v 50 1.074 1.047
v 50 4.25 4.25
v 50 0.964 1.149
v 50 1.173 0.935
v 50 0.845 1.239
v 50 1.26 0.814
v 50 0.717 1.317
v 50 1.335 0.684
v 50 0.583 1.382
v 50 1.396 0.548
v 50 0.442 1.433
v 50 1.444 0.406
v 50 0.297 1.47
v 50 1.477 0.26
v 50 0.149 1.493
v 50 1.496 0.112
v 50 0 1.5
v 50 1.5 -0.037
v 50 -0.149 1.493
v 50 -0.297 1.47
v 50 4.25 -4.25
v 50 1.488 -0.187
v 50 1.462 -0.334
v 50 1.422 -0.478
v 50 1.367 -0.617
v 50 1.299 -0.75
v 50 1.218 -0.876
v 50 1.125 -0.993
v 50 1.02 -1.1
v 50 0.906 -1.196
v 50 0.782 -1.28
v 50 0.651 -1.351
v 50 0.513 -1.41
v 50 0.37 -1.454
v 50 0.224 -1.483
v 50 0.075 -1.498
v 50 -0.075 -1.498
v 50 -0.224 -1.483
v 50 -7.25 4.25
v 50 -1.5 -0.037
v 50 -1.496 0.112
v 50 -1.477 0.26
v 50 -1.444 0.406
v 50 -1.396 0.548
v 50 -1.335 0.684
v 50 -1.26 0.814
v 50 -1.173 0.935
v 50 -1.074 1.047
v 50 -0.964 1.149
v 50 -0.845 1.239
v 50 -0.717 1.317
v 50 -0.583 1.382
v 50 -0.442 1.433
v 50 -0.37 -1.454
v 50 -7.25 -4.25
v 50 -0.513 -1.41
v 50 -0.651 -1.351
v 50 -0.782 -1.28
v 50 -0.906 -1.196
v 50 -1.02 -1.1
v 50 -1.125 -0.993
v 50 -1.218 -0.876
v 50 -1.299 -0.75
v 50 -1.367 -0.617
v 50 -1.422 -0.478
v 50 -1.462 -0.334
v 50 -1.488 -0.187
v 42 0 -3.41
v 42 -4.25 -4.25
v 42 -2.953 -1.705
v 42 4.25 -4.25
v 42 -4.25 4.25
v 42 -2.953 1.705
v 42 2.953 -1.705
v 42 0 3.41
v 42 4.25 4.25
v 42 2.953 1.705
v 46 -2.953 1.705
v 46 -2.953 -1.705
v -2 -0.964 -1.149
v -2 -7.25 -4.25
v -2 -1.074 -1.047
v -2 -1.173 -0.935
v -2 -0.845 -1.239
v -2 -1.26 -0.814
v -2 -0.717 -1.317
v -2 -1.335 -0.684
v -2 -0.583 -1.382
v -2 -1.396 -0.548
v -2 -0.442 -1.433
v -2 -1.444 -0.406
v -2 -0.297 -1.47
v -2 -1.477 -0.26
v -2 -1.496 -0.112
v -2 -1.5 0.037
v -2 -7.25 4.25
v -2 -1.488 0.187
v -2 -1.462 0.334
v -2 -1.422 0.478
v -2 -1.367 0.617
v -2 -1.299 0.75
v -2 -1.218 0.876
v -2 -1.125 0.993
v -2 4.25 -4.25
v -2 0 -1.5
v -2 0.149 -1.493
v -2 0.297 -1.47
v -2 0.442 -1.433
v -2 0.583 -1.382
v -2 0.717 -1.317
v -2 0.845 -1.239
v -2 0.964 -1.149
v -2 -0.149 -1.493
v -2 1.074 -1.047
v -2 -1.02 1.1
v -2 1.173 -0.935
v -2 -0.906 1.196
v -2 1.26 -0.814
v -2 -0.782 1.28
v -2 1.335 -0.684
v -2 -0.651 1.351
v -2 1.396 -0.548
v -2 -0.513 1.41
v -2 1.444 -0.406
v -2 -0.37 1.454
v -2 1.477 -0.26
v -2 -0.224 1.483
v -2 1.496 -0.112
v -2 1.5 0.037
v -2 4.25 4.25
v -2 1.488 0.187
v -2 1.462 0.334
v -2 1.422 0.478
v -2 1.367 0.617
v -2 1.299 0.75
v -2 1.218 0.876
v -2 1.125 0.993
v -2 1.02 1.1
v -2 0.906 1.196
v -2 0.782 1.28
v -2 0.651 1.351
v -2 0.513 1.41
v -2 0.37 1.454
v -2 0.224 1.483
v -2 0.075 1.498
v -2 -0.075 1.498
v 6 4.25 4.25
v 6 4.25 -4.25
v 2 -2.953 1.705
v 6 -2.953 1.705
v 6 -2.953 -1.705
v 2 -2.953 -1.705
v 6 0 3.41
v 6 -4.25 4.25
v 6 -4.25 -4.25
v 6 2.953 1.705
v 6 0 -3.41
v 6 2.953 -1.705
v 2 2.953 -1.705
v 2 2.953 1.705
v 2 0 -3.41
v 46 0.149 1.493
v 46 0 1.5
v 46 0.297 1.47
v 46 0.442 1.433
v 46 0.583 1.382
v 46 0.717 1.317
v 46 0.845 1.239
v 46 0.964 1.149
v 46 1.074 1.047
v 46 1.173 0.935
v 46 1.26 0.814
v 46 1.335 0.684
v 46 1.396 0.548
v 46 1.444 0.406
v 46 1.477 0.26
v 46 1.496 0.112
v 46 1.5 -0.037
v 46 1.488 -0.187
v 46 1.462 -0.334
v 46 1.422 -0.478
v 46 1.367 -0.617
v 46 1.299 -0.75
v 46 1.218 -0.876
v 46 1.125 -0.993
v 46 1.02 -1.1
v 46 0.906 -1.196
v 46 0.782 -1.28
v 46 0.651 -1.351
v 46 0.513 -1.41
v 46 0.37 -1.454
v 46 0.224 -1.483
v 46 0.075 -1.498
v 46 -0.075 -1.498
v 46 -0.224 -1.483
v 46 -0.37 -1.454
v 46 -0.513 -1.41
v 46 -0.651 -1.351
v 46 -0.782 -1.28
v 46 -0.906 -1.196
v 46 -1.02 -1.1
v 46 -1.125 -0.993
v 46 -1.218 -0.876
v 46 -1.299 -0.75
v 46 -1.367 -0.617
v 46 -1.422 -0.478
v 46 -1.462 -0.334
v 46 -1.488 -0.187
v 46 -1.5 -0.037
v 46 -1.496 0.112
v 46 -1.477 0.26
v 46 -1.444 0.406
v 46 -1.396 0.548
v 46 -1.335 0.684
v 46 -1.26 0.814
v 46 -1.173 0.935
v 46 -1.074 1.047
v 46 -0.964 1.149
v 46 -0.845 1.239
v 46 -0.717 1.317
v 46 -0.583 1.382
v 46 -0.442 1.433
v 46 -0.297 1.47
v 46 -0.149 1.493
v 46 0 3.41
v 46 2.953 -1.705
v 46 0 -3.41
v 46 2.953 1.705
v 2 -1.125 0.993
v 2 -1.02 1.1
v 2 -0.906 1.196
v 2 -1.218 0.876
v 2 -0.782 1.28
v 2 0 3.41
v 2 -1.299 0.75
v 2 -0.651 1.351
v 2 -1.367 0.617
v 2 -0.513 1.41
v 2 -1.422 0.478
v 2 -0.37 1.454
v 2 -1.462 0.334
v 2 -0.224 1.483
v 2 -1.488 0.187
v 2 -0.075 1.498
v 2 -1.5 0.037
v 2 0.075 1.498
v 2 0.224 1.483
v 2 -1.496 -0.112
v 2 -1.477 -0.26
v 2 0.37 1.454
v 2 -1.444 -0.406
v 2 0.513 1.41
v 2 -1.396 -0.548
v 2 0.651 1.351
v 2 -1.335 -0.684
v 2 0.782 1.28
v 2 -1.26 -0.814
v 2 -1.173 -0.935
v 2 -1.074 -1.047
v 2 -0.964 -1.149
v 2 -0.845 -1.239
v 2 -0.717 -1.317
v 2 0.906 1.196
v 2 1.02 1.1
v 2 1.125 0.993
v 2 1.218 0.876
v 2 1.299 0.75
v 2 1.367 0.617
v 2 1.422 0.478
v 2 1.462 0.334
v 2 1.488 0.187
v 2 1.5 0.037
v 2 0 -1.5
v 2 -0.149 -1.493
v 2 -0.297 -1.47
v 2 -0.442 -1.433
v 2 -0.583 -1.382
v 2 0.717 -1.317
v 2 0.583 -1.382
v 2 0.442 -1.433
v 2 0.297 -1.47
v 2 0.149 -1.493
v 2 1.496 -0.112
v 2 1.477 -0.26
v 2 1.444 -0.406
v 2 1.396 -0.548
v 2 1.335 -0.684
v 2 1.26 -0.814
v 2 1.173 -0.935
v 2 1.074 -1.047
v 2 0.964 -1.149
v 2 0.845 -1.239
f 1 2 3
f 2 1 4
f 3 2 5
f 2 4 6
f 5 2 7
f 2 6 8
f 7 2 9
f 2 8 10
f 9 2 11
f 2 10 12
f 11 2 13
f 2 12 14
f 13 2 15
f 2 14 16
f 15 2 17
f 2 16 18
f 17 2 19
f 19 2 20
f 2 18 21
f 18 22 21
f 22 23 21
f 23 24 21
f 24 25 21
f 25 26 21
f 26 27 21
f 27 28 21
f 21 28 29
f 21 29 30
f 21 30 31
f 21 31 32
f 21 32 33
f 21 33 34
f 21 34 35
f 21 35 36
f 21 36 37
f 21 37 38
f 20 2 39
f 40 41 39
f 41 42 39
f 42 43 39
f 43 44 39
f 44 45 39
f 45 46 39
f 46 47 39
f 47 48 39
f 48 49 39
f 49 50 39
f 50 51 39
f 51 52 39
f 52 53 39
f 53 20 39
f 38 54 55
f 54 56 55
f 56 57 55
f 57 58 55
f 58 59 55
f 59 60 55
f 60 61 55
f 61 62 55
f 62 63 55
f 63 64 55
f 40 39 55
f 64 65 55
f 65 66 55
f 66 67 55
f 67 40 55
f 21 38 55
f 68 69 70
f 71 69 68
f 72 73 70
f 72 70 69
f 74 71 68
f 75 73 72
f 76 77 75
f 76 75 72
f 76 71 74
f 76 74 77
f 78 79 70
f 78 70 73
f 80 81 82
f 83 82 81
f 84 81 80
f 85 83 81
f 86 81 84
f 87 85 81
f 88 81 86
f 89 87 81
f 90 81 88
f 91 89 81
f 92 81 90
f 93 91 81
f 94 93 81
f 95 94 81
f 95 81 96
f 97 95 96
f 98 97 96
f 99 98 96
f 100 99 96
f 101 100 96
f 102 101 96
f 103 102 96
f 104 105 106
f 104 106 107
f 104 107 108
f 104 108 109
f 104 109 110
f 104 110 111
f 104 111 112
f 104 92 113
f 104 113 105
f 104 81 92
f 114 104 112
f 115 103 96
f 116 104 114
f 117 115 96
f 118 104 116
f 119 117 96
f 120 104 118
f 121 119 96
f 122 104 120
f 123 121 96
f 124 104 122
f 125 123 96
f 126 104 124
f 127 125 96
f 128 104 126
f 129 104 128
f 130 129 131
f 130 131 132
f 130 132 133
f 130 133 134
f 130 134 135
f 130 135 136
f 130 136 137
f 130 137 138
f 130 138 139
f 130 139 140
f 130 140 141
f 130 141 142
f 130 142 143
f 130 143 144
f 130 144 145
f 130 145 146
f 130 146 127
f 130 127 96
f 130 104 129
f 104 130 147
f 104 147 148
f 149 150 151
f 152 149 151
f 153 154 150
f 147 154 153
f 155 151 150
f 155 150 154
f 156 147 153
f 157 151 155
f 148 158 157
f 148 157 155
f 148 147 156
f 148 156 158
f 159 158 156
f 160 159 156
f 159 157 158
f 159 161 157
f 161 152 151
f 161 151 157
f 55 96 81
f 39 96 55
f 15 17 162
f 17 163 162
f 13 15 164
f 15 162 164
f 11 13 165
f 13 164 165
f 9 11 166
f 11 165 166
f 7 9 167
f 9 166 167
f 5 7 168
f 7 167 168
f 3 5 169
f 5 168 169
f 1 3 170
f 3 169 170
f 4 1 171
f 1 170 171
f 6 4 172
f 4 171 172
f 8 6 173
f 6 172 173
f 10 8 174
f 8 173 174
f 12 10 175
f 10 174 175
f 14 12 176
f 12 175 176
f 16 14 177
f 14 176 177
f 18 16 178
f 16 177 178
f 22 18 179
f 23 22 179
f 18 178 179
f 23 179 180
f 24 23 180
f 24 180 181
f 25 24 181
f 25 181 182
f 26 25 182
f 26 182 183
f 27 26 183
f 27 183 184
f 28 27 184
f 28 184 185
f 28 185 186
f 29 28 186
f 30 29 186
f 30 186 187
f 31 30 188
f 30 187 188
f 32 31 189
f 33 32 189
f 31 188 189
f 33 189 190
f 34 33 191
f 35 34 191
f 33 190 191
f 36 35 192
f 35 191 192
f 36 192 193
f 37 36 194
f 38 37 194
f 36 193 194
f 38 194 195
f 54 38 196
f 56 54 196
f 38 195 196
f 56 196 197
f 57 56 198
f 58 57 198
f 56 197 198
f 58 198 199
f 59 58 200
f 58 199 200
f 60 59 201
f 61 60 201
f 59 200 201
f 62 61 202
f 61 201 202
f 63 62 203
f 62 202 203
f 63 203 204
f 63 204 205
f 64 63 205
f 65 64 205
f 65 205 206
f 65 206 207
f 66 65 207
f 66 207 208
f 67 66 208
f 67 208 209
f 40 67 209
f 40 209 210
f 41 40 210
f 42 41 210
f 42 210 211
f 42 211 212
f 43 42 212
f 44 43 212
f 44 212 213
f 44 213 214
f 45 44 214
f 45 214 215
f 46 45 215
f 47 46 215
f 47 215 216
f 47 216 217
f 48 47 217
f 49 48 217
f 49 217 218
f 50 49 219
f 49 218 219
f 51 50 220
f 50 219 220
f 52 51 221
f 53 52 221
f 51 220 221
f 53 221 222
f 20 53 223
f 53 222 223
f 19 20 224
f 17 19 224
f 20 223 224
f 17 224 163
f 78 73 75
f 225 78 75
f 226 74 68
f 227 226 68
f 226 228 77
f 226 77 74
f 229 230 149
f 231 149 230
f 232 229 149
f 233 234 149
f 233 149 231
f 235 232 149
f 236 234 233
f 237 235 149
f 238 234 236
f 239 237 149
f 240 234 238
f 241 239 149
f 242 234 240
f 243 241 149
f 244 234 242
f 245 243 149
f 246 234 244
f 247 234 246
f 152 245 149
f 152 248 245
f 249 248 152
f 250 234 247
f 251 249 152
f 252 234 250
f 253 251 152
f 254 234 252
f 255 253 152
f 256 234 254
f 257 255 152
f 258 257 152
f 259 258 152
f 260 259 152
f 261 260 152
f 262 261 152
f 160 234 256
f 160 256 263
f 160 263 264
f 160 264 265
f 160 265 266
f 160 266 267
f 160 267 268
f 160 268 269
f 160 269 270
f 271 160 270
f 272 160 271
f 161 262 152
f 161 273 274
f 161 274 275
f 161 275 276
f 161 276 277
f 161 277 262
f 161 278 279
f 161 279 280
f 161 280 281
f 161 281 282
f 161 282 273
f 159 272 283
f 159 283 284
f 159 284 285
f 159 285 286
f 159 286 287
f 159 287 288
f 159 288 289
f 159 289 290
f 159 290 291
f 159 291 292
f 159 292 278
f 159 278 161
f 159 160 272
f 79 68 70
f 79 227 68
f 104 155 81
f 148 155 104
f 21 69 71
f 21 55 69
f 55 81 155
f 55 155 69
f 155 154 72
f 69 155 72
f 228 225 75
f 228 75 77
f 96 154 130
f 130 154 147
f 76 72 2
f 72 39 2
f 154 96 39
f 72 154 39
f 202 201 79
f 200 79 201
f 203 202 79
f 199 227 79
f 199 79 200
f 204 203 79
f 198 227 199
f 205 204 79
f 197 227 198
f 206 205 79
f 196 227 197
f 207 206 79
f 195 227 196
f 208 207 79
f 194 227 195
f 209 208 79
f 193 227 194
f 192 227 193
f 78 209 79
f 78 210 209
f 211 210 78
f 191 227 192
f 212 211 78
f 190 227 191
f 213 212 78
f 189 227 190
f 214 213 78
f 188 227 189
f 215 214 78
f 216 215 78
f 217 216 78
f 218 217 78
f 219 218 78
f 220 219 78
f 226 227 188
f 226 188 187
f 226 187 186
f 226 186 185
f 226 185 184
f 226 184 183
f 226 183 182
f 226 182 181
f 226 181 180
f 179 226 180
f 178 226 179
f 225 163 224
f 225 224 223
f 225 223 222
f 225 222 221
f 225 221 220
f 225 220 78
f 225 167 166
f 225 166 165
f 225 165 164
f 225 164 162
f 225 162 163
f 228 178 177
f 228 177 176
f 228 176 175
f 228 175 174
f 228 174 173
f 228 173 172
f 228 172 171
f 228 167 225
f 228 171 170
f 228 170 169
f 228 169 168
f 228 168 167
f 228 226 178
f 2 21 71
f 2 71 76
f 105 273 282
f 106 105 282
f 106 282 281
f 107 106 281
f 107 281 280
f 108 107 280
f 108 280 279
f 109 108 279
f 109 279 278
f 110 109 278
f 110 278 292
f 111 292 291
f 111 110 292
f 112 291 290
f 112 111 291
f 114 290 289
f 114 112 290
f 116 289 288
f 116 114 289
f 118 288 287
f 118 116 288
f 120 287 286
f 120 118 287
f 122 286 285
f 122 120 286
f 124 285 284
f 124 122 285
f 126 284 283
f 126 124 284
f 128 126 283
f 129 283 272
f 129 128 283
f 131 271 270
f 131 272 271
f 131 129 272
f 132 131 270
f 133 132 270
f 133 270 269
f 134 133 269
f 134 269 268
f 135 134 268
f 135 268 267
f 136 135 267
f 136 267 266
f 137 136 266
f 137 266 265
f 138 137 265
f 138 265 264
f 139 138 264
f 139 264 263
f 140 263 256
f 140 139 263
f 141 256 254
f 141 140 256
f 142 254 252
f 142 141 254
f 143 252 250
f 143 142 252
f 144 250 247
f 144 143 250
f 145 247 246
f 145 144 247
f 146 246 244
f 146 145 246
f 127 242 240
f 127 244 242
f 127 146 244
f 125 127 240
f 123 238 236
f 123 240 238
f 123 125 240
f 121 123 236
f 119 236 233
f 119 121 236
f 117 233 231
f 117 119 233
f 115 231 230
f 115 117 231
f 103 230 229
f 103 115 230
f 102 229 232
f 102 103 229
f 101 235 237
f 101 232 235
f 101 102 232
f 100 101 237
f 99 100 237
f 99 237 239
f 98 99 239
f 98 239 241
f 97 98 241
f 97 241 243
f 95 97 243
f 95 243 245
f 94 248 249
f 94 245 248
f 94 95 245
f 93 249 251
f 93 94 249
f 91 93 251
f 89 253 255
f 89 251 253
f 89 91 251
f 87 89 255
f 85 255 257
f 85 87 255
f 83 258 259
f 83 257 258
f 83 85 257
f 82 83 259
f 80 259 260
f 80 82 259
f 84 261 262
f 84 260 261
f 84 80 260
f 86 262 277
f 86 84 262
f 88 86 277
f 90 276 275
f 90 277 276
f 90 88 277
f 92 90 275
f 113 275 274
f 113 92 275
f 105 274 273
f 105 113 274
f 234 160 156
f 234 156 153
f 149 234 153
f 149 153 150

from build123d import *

# Parameters (mm, degrees)
SKETCH1_W           = 8.5
SKETCH1_H           = 8.5
BOSS_EXTRUDE1_DEPTH = 5
SKETCH2_W           = 8.5
SKETCH2_H           = 8.5
BOSS_EXTRUDE2_DEPTH = 2
SKETCH3_R           = 1.5
CUT_EXTRUDE1_DEPTH  = 2
SKETCH4_W           = 52
SKETCH4_H           = 8.5
BOSS_EXTRUDE3_DEPTH = 3
SKETCH5_W           = 7
SKETCH5_H           = 8.5
BOSS_EXTRUDE4_DEPTH = 8.5
CUT_EXTRUDE2_DEPTH  = 5
SKETCH7_R           = 1.5
CUT_EXTRUDE3_DEPTH  = 5
SKETCH8_R           = 1.5
BOSS_EXTRUDE5_DEPTH = 2.5
SKETCH9_R           = 1.5
BOSS_EXTRUDE6_DEPTH = 2.5
SKETCH10_W          = 8.5
SKETCH10_H          = 8.5
BOSS_EXTRUDE7_DEPTH = 1
SKETCH11_W          = 8.5
SKETCH11_H          = 8.5
BOSS_EXTRUDE8_DEPTH = 1
CUT_EXTRUDE4_DEPTH  = 0.5
CUT_EXTRUDE5_DEPTH  = 0.5


with BuildPart() as part:
    # Sketch1 → Boss-Extrude1 (new body)
    with BuildSketch(Plane(origin=(0, 0, 0), x_dir=(0, 0, -1), z_dir=(1, 0, 0))):
        Rectangle(SKETCH1_W, SKETCH1_H)
        Polygon((1.705, 2.953146627), (-1.705, 2.953146627), (-3.41, 0), (-1.705, -2.953146627), (1.705, -2.953146627), (3.41, 0), align=None, mode=Mode.SUBTRACT)
    extrude(amount=BOSS_EXTRUDE1_DEPTH)

    # Sketch2 → Boss-Extrude2 (add)
    with BuildSketch(Plane.ZY):
        Rectangle(SKETCH2_W, SKETCH2_H)
    extrude(amount=BOSS_EXTRUDE2_DEPTH)

    # Sketch3 → Cut-Extrude1 (cut)
    with BuildSketch(Plane(origin=(0, 0, 0), x_dir=(0, 0, -1), z_dir=(1, 0, 0))):
        Circle(SKETCH3_R)
    extrude(amount=-CUT_EXTRUDE1_DEPTH, mode=Mode.SUBTRACT)

    # Sketch4 → Boss-Extrude3 (add)
    with BuildSketch(Plane.XZ.offset(4.25)):
        with Locations((24, 0)):
            Rectangle(SKETCH4_W, SKETCH4_H)
    extrude(amount=BOSS_EXTRUDE3_DEPTH)

    # Sketch5 → Boss-Extrude4 (add)
    with BuildSketch(Plane(origin=(0, -4.25, 0), x_dir=(1, 0, 0), z_dir=(0, 1, 0))):
        with Locations((46.5, 0)):
            Rectangle(SKETCH5_W, SKETCH5_H)
    extrude(amount=BOSS_EXTRUDE4_DEPTH)

    # Sketch6 → Cut-Extrude2 (cut)
    with BuildSketch(Plane.ZY.offset(-43)):
        Polygon((3.41, 0), (1.705, 2.953146627), (-1.705, 2.953146627), (-3.41, 0), (-1.705, -2.953146627), (1.705, -2.953146627), align=None)
    extrude(amount=-CUT_EXTRUDE2_DEPTH, mode=Mode.SUBTRACT)

    # Sketch7 → Cut-Extrude3 (cut)
    with BuildSketch(Plane.ZY.offset(-48)):
        Circle(SKETCH7_R)
    extrude(amount=-CUT_EXTRUDE3_DEPTH, mode=Mode.SUBTRACT)

    # Sketch8 → Boss-Extrude5 (add)
    with BuildSketch(Plane(origin=(0, 0, 0), x_dir=(0, 0, -1), z_dir=(1, 0, 0))):
        Polygon((-1.705, 2.953146627), (-3.41, 0), (-1.705, -2.953146627), (1.705, -2.953146627), (3.41, 0), (1.705, 2.953146627), align=None)
        Circle(SKETCH8_R, mode=Mode.SUBTRACT)
    extrude(amount=BOSS_EXTRUDE5_DEPTH)

    # Sketch9 → Boss-Extrude6 (add)
    with BuildSketch(Plane.ZY.offset(-48)):
        Polygon((3.41, 0), (1.705, 2.953146627), (-1.705, 2.953146627), (-3.41, 0), (-1.705, -2.953146627), (1.705, -2.953146627), align=None)
        Circle(SKETCH9_R, mode=Mode.SUBTRACT)
    extrude(amount=BOSS_EXTRUDE6_DEPTH)

    # Sketch10 → Boss-Extrude7 (add)
    with BuildSketch(Plane(origin=(5, 0, 0), x_dir=(0, 0, -1), z_dir=(1, 0, 0))):
        Rectangle(SKETCH10_W, SKETCH10_H)
        Polygon((3.41, 0), (1.705, 2.953146627), (-1.705, 2.953146627), (-3.41, 0), (-1.705, -2.953146627), (1.705, -2.953146627), align=None, mode=Mode.SUBTRACT)
    extrude(amount=BOSS_EXTRUDE7_DEPTH)

    # Sketch11 → Boss-Extrude8 (add)
    with BuildSketch(Plane.ZY.offset(-43)):
        Rectangle(SKETCH11_W, SKETCH11_H)
        Polygon((-3.41, 0), (-1.705, -2.953146627), (1.705, -2.953146627), (3.41, 0), (1.705, 2.953146627), (-1.705, 2.953146627), align=None, mode=Mode.SUBTRACT)
    extrude(amount=BOSS_EXTRUDE8_DEPTH)

    # Sketch12 → Cut-Extrude4 (cut)
    with BuildSketch(Plane(origin=(2.5, 0, 0), x_dir=(0, 0, -1), z_dir=(1, 0, 0))):
        Polygon((1.705, -2.953146627), (3.41, 0), (1.705, 2.953146627), (-1.705, 2.953146627), (-3.41, 0), (-1.705, -2.953146627), align=None)
    extrude(amount=-CUT_EXTRUDE4_DEPTH, mode=Mode.SUBTRACT)

    # Sketch13 → Cut-Extrude5 (cut)
    with BuildSketch(Plane.ZY.offset(-45.5)):
        Polygon((1.705, 2.953146627), (-1.705, 2.953146627), (-3.41, 0), (-1.705, -2.953146627), (1.705, -2.953146627), (3.41, 0), align=None)
    extrude(amount=-CUT_EXTRUDE5_DEPTH, mode=Mode.SUBTRACT)


solid = part.part
